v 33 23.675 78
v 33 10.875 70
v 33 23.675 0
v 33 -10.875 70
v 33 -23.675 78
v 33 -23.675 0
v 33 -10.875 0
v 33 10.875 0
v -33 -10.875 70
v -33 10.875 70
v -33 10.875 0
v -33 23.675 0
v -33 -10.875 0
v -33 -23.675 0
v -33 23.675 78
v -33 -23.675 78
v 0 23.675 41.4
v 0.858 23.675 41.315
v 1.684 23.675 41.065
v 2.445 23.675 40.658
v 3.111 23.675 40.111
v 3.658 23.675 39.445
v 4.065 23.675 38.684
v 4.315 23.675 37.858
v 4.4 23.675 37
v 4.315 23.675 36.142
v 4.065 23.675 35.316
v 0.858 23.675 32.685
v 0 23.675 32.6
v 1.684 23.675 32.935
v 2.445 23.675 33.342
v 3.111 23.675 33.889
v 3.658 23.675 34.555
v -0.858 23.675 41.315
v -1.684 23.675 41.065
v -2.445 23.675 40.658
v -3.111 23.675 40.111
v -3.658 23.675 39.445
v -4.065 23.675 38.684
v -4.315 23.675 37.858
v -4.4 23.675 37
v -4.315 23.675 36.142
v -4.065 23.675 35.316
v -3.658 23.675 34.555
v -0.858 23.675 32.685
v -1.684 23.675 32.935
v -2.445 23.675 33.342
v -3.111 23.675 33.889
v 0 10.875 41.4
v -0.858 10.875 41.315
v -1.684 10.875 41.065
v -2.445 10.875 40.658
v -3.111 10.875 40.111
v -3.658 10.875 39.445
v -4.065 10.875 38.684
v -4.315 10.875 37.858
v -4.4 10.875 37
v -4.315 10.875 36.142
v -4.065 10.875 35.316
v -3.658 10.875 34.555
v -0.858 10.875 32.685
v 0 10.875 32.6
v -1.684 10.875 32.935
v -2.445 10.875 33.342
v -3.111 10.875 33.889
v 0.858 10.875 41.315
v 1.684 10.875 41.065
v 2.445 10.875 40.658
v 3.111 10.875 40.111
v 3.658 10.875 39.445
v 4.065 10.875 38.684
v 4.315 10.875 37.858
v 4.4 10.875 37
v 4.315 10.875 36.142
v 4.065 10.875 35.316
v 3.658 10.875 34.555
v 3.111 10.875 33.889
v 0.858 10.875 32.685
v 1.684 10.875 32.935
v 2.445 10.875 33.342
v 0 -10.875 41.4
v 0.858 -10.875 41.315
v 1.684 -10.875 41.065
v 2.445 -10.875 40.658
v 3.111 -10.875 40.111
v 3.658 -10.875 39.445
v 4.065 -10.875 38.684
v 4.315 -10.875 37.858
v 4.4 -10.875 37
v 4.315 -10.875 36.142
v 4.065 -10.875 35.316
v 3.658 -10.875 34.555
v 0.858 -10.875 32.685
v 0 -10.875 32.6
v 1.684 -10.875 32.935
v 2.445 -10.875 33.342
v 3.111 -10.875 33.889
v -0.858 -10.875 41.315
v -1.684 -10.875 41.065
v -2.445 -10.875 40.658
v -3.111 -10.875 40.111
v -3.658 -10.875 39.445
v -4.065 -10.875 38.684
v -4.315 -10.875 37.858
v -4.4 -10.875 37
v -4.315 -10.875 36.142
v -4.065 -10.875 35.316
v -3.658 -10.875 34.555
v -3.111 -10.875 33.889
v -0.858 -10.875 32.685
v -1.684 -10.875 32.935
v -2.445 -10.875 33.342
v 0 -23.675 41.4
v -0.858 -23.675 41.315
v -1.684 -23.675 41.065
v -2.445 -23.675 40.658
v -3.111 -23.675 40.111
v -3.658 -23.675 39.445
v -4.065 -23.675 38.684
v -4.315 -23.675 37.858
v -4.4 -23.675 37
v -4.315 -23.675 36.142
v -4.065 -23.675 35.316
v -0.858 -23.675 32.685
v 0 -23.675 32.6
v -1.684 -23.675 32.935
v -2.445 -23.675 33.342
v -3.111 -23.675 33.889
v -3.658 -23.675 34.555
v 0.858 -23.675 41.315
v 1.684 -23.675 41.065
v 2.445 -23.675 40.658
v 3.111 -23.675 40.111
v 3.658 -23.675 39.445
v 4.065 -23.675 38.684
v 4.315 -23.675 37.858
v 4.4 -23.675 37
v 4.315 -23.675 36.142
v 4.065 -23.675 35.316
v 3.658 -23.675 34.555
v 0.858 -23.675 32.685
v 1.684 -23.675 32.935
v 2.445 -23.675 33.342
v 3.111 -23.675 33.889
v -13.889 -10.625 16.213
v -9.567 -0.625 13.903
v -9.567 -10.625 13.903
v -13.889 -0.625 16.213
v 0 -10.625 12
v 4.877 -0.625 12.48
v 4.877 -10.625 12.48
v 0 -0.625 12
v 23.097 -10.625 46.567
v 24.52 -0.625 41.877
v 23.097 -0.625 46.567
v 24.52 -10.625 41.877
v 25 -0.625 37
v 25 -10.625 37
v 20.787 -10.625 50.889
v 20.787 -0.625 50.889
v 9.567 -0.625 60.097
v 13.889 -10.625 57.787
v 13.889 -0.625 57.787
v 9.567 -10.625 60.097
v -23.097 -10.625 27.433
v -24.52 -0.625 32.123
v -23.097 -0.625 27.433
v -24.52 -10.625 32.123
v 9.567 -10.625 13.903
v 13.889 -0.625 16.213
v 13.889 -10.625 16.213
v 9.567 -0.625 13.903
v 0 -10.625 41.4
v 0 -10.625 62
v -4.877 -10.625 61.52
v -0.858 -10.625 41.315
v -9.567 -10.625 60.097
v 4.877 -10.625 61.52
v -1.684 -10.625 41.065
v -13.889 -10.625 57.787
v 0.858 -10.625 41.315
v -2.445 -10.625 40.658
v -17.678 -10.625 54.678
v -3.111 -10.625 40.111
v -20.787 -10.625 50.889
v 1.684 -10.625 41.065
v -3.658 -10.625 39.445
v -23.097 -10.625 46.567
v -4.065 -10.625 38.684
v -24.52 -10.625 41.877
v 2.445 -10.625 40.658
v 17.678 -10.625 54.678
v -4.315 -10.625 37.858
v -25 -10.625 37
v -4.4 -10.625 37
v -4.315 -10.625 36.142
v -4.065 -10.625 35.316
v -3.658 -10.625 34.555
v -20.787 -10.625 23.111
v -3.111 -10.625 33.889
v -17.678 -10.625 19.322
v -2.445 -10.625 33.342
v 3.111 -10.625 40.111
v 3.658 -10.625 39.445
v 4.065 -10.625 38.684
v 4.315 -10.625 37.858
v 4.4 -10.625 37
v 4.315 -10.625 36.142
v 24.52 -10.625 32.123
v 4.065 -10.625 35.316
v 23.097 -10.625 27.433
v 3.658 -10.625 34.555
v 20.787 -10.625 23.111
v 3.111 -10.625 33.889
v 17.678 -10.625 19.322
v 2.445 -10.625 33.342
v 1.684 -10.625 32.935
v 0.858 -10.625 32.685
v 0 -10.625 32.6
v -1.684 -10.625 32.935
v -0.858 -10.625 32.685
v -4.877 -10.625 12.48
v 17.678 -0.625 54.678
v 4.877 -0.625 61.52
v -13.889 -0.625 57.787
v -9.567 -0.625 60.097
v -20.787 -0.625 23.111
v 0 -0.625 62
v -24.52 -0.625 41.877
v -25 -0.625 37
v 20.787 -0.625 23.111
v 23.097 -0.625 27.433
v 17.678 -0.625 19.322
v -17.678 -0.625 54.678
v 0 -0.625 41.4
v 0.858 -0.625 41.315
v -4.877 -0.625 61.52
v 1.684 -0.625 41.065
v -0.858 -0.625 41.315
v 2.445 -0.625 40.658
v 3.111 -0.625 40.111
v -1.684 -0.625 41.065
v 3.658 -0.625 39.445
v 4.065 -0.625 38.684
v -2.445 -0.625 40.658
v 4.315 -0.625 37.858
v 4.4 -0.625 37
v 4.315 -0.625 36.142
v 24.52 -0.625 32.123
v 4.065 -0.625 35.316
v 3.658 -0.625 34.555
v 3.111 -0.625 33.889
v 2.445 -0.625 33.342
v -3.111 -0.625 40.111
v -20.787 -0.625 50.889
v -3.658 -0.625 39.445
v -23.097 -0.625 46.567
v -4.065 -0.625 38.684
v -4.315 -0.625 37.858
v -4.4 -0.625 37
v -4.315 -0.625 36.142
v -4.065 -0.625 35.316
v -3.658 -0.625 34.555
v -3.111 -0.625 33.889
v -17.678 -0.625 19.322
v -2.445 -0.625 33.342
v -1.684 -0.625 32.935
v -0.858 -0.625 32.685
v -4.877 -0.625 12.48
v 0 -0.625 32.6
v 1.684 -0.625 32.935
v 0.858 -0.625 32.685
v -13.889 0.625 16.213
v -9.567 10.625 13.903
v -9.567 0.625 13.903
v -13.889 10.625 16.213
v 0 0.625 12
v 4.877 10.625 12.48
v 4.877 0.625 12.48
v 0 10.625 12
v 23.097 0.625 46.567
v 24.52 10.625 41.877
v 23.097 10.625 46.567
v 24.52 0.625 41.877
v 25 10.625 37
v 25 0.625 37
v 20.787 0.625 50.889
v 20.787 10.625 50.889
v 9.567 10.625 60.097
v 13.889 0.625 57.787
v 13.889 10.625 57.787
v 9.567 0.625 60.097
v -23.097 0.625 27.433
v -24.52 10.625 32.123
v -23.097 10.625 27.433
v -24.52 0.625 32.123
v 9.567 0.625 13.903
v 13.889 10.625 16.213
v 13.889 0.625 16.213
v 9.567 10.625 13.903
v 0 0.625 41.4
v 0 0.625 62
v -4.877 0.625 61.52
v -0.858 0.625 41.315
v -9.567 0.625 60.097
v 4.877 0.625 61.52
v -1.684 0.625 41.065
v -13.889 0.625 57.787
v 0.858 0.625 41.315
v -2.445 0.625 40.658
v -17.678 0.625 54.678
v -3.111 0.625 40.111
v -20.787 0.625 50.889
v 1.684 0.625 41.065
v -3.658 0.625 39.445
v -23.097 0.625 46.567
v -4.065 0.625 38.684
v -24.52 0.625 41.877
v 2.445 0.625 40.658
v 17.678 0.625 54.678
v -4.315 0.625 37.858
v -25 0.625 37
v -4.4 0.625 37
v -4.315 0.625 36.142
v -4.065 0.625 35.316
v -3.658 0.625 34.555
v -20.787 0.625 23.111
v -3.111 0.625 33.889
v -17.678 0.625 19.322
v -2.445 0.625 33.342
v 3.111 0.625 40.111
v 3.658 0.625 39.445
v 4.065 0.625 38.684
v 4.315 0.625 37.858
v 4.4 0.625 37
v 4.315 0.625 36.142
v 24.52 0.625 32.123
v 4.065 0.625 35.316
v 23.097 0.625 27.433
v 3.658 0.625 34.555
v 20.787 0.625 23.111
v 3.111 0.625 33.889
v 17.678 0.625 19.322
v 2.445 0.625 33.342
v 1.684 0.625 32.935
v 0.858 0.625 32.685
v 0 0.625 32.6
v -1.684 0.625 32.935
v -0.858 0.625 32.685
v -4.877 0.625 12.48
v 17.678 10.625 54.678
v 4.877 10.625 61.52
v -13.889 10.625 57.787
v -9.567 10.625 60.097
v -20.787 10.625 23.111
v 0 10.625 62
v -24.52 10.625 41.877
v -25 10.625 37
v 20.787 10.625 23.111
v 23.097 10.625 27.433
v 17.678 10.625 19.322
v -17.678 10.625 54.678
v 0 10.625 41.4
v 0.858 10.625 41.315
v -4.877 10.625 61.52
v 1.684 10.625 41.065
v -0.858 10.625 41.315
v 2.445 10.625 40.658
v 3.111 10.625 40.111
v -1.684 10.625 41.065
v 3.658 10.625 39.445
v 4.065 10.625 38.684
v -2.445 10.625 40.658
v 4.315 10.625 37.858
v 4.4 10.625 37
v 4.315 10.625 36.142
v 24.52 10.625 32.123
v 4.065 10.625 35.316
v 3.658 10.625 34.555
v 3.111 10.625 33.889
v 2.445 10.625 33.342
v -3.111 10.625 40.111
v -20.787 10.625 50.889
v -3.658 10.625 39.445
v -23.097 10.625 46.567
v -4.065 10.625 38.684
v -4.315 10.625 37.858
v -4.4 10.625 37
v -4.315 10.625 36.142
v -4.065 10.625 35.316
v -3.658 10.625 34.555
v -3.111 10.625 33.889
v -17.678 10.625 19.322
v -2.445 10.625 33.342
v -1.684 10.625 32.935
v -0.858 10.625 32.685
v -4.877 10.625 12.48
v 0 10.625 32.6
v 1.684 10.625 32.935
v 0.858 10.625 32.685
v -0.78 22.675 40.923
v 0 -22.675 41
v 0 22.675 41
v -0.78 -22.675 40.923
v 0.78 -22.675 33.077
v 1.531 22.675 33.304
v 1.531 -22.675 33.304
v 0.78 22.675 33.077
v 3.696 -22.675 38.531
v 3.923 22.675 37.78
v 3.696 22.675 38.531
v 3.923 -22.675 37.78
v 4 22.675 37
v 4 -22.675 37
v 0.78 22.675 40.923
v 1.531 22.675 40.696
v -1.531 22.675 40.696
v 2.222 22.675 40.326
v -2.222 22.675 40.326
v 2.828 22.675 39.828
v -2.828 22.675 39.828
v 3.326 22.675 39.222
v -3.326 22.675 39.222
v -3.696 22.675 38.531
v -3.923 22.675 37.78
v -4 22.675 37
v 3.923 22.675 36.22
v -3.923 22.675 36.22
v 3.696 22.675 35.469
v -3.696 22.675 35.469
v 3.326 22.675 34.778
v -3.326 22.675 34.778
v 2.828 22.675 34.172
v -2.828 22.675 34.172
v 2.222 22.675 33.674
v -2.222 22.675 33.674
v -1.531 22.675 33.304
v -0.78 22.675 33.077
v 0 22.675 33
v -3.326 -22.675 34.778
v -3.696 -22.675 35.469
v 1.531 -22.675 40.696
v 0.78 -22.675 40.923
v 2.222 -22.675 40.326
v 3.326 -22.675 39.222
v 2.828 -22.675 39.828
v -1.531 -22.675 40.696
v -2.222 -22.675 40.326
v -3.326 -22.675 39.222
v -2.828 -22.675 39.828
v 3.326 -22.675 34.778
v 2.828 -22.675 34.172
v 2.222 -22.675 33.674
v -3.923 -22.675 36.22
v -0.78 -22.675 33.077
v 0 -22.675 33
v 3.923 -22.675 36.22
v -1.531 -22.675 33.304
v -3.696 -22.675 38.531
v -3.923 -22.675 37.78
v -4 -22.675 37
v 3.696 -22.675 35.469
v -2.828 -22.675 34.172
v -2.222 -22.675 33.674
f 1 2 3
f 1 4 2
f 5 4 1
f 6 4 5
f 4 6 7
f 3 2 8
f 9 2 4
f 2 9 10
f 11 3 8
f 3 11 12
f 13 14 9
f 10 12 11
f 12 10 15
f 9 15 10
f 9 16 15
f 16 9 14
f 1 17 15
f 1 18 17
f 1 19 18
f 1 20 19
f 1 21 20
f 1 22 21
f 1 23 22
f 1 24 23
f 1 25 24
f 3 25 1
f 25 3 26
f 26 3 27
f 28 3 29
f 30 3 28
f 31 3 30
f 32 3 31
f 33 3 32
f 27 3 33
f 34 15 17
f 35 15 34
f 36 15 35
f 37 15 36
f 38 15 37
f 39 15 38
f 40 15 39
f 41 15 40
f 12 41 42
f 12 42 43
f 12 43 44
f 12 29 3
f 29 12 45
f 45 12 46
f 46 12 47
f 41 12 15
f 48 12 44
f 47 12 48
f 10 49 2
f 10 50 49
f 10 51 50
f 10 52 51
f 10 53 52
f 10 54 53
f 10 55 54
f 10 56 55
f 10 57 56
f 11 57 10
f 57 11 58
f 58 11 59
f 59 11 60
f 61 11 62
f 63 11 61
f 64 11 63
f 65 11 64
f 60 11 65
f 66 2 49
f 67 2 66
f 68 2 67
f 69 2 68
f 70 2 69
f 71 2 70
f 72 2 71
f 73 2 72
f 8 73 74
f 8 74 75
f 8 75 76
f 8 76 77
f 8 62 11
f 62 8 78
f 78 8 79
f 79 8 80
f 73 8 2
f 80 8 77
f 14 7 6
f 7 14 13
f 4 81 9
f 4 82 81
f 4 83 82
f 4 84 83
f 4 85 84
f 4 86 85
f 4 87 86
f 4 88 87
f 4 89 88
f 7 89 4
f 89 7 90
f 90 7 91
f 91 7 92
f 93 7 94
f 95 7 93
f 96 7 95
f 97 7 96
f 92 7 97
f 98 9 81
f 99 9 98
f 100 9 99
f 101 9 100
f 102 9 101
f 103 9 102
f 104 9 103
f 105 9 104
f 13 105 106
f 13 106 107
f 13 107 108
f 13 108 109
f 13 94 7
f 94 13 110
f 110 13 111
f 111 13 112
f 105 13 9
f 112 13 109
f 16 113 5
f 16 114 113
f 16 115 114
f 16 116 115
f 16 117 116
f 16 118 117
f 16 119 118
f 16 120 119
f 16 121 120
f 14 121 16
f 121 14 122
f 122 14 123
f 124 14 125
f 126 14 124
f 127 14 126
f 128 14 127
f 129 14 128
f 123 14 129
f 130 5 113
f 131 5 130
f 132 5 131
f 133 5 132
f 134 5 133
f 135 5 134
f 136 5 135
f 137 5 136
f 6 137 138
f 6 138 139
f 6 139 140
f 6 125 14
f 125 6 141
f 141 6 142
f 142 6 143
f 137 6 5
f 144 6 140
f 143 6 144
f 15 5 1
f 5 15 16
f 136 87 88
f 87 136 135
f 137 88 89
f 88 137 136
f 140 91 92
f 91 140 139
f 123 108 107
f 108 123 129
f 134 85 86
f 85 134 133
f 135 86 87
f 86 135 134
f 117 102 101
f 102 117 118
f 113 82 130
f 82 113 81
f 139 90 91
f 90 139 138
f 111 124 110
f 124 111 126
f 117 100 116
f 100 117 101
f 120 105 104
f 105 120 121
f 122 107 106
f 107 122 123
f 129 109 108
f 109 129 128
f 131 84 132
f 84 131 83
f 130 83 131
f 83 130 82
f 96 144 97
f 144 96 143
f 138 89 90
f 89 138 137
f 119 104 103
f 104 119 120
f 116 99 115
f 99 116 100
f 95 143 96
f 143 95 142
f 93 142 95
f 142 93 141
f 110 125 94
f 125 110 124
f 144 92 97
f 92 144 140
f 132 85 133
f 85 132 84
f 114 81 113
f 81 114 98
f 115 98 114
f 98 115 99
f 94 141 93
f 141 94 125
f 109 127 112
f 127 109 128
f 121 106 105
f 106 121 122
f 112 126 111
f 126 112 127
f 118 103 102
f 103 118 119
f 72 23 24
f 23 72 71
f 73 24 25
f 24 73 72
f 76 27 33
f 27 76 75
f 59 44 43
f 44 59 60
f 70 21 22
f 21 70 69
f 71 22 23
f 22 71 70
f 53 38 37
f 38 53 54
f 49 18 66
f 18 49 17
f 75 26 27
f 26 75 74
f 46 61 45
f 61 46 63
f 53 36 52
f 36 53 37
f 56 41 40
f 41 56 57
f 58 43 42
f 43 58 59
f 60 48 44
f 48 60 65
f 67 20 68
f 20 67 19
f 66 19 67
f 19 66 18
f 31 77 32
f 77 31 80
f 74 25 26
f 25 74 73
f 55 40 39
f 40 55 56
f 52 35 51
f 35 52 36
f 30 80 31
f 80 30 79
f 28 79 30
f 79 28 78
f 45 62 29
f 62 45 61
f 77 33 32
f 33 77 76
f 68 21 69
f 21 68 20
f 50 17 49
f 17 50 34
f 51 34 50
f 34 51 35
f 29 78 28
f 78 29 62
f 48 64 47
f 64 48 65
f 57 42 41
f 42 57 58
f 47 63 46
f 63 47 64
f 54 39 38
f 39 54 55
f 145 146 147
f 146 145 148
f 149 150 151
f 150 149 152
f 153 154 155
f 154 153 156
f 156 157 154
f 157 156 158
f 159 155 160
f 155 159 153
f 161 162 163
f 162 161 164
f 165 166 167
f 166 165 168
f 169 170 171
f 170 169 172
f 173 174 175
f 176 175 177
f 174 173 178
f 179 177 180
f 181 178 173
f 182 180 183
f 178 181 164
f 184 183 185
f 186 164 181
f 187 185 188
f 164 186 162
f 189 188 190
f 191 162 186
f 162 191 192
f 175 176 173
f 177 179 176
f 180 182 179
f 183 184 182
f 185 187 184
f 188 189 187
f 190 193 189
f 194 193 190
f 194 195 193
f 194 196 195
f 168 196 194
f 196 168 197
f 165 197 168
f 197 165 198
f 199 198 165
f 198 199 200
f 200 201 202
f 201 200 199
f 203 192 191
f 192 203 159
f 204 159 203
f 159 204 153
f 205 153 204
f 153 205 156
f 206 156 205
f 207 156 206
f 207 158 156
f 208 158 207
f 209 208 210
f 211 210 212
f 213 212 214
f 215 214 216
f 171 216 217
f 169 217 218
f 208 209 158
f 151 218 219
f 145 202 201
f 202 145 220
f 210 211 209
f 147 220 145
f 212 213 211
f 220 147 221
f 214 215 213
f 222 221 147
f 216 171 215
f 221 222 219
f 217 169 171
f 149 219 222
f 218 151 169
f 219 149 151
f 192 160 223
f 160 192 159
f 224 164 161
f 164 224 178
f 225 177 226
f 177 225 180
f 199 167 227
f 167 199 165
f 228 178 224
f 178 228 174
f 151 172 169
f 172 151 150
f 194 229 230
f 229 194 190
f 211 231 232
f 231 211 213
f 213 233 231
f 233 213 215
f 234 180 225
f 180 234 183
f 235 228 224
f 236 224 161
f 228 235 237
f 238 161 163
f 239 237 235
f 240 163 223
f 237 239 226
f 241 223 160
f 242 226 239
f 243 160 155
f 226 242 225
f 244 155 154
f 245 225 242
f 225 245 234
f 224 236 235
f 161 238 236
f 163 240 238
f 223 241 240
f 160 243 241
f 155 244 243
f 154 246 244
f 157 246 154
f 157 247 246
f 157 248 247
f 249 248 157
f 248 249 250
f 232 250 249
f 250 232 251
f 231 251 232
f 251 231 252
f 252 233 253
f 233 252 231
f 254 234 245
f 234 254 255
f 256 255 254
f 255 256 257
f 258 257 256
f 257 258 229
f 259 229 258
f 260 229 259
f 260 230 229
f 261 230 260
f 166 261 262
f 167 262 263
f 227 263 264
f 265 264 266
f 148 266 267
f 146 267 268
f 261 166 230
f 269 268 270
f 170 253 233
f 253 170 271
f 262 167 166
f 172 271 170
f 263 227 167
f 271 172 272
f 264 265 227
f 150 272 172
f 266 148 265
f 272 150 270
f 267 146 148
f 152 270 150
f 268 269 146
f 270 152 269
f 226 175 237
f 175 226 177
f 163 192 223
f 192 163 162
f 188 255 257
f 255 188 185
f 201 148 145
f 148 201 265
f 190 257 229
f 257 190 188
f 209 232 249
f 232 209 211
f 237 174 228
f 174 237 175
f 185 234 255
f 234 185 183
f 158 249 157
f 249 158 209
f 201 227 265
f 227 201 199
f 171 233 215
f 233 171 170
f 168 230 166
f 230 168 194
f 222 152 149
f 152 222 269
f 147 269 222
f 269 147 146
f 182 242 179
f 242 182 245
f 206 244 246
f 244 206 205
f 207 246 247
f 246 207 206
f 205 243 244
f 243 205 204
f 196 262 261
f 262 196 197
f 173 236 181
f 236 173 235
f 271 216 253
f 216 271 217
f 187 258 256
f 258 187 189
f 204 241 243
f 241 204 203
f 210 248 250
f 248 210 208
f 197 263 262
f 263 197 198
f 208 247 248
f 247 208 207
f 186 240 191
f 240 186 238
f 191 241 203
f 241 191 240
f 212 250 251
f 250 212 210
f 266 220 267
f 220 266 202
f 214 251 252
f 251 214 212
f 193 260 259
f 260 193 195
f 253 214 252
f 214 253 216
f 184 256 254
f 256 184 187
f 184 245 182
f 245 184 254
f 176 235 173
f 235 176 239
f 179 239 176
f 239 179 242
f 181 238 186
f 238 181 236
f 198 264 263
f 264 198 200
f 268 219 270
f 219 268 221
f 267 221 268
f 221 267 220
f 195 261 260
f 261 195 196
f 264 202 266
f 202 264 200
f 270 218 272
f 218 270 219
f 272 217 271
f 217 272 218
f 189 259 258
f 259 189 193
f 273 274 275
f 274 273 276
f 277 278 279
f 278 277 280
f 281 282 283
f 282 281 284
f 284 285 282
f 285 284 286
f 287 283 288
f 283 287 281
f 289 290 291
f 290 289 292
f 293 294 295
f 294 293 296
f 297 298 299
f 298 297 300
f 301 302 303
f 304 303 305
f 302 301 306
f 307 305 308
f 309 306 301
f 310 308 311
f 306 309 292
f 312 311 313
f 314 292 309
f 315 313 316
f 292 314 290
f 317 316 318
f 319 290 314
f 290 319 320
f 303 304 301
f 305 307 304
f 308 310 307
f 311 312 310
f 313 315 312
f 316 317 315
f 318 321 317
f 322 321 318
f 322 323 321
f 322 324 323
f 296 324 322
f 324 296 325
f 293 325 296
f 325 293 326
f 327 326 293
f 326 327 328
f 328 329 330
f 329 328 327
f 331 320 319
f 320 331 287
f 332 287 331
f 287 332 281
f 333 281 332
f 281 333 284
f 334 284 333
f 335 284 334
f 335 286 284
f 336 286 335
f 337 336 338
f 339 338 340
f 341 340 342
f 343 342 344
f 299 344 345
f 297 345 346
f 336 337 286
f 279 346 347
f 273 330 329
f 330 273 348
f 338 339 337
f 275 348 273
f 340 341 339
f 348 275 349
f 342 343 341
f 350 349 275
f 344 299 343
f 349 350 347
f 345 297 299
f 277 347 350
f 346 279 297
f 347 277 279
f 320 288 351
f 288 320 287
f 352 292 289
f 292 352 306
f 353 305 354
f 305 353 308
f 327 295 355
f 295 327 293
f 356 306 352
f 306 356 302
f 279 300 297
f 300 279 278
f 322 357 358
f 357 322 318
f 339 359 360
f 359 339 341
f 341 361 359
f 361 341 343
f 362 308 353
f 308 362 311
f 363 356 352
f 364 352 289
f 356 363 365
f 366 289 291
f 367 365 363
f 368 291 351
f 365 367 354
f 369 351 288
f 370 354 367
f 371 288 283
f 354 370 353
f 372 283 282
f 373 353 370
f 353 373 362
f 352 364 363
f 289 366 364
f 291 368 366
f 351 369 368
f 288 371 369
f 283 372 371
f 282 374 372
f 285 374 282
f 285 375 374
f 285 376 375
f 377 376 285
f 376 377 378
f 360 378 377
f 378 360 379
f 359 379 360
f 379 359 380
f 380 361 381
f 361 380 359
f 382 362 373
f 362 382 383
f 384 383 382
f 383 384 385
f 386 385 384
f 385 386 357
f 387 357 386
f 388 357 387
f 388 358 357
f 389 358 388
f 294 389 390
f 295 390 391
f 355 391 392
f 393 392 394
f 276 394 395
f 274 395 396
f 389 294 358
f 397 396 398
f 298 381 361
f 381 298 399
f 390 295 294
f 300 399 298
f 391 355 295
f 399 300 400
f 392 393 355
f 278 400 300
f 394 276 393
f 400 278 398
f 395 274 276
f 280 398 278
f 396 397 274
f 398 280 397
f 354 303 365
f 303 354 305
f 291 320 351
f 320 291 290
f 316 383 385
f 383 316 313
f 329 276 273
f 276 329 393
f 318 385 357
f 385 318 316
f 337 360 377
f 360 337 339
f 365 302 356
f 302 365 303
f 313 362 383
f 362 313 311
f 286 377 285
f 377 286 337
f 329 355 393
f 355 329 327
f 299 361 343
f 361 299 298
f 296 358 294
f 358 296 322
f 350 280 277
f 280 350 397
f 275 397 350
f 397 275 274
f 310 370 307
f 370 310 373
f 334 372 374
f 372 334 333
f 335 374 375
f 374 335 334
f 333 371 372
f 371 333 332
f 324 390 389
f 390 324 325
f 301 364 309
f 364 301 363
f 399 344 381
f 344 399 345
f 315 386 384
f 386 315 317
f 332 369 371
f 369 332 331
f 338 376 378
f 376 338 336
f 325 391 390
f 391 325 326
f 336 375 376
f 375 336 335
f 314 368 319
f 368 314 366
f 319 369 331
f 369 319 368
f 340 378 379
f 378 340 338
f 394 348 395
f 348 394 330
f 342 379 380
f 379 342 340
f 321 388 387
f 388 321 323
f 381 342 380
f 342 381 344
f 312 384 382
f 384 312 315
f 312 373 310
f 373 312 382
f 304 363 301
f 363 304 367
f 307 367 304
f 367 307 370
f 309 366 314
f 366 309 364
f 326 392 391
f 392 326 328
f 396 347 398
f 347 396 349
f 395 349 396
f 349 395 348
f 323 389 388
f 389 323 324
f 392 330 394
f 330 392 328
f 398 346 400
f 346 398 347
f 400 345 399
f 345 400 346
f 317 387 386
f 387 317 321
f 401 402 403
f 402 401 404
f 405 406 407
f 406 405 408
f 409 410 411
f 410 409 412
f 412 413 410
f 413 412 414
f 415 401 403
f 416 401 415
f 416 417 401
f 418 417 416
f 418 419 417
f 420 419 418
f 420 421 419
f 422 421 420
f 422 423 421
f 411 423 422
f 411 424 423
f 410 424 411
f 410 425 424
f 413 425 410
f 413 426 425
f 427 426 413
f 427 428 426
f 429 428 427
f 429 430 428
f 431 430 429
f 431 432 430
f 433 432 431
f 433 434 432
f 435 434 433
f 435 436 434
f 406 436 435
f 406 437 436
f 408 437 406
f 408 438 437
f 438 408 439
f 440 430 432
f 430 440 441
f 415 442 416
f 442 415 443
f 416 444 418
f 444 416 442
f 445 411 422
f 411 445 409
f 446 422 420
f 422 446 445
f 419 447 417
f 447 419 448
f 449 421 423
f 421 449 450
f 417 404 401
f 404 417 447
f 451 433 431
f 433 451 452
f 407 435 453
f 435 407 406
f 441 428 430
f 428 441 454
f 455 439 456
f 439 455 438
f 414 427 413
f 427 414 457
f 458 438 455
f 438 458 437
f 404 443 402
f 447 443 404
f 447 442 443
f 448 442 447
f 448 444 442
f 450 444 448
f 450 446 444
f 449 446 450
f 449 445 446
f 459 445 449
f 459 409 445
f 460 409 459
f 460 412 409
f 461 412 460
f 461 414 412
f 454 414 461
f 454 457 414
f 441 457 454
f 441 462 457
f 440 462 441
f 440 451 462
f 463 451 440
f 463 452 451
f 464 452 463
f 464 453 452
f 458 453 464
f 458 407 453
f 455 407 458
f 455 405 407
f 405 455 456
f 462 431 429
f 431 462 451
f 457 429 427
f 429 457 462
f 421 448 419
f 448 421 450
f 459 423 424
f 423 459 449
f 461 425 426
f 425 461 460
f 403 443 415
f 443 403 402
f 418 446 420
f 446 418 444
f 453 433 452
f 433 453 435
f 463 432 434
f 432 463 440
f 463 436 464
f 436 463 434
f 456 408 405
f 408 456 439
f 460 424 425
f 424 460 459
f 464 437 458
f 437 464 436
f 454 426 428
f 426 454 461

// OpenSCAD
$fn = 32;

// ------------------------------------------------------------------------
// Trolley wheel set: wheels d50, fork 70 mm tall
// Every part is its own module, assembly() places every instance.
// ------------------------------------------------------------------------

// --- part 1 ---
module trolley_fork() {
  difference() {
    union() {
      translate([-33, 10.875, 0]) cube([66, 12.8, 70]);
      translate([-33, -23.675, 0]) cube([66, 12.8, 70]);
      translate([-33, -23.675, 70]) cube([66, 47.35, 8]);
    }
    translate([0, -17.275, 37]) rotate([90, 0, 0]) cylinder(h = 14.8, d = 8.8, center = true);
    translate([0, 17.275, 37]) rotate([90, 0, 0]) cylinder(h = 14.8, d = 8.8, center = true);
  }
}

// --- part 2 ---
module trolley_wheel() {
  difference() {
      translate([0, 0, 0]) cylinder(h = 10, d = 50);
      translate([0, 0, -1]) cylinder(h = 12, d = 8.8);
    }
}

// --- part 3 ---
module trolley_axle() {
  translate([0, 0, -22.675]) cylinder(h = 45.35, d = 8);
}

// --- assembly ---
module assembly() {
  color([0.80, 0.24, 0.20]) translate([0, 0, 0]) rotate([0, 0, 0]) trolley_fork();
  color([0.20, 0.45, 0.75]) translate([0, -0.625, 37]) rotate([90, 0, 0]) trolley_wheel();
  color([0.25, 0.62, 0.32]) translate([0, 10.625, 37]) rotate([90, 0, 0]) trolley_wheel();
  color([0.92, 0.70, 0.18]) translate([0, 0, 37]) rotate([90, 0, 0]) trolley_axle();
}

assembly();
